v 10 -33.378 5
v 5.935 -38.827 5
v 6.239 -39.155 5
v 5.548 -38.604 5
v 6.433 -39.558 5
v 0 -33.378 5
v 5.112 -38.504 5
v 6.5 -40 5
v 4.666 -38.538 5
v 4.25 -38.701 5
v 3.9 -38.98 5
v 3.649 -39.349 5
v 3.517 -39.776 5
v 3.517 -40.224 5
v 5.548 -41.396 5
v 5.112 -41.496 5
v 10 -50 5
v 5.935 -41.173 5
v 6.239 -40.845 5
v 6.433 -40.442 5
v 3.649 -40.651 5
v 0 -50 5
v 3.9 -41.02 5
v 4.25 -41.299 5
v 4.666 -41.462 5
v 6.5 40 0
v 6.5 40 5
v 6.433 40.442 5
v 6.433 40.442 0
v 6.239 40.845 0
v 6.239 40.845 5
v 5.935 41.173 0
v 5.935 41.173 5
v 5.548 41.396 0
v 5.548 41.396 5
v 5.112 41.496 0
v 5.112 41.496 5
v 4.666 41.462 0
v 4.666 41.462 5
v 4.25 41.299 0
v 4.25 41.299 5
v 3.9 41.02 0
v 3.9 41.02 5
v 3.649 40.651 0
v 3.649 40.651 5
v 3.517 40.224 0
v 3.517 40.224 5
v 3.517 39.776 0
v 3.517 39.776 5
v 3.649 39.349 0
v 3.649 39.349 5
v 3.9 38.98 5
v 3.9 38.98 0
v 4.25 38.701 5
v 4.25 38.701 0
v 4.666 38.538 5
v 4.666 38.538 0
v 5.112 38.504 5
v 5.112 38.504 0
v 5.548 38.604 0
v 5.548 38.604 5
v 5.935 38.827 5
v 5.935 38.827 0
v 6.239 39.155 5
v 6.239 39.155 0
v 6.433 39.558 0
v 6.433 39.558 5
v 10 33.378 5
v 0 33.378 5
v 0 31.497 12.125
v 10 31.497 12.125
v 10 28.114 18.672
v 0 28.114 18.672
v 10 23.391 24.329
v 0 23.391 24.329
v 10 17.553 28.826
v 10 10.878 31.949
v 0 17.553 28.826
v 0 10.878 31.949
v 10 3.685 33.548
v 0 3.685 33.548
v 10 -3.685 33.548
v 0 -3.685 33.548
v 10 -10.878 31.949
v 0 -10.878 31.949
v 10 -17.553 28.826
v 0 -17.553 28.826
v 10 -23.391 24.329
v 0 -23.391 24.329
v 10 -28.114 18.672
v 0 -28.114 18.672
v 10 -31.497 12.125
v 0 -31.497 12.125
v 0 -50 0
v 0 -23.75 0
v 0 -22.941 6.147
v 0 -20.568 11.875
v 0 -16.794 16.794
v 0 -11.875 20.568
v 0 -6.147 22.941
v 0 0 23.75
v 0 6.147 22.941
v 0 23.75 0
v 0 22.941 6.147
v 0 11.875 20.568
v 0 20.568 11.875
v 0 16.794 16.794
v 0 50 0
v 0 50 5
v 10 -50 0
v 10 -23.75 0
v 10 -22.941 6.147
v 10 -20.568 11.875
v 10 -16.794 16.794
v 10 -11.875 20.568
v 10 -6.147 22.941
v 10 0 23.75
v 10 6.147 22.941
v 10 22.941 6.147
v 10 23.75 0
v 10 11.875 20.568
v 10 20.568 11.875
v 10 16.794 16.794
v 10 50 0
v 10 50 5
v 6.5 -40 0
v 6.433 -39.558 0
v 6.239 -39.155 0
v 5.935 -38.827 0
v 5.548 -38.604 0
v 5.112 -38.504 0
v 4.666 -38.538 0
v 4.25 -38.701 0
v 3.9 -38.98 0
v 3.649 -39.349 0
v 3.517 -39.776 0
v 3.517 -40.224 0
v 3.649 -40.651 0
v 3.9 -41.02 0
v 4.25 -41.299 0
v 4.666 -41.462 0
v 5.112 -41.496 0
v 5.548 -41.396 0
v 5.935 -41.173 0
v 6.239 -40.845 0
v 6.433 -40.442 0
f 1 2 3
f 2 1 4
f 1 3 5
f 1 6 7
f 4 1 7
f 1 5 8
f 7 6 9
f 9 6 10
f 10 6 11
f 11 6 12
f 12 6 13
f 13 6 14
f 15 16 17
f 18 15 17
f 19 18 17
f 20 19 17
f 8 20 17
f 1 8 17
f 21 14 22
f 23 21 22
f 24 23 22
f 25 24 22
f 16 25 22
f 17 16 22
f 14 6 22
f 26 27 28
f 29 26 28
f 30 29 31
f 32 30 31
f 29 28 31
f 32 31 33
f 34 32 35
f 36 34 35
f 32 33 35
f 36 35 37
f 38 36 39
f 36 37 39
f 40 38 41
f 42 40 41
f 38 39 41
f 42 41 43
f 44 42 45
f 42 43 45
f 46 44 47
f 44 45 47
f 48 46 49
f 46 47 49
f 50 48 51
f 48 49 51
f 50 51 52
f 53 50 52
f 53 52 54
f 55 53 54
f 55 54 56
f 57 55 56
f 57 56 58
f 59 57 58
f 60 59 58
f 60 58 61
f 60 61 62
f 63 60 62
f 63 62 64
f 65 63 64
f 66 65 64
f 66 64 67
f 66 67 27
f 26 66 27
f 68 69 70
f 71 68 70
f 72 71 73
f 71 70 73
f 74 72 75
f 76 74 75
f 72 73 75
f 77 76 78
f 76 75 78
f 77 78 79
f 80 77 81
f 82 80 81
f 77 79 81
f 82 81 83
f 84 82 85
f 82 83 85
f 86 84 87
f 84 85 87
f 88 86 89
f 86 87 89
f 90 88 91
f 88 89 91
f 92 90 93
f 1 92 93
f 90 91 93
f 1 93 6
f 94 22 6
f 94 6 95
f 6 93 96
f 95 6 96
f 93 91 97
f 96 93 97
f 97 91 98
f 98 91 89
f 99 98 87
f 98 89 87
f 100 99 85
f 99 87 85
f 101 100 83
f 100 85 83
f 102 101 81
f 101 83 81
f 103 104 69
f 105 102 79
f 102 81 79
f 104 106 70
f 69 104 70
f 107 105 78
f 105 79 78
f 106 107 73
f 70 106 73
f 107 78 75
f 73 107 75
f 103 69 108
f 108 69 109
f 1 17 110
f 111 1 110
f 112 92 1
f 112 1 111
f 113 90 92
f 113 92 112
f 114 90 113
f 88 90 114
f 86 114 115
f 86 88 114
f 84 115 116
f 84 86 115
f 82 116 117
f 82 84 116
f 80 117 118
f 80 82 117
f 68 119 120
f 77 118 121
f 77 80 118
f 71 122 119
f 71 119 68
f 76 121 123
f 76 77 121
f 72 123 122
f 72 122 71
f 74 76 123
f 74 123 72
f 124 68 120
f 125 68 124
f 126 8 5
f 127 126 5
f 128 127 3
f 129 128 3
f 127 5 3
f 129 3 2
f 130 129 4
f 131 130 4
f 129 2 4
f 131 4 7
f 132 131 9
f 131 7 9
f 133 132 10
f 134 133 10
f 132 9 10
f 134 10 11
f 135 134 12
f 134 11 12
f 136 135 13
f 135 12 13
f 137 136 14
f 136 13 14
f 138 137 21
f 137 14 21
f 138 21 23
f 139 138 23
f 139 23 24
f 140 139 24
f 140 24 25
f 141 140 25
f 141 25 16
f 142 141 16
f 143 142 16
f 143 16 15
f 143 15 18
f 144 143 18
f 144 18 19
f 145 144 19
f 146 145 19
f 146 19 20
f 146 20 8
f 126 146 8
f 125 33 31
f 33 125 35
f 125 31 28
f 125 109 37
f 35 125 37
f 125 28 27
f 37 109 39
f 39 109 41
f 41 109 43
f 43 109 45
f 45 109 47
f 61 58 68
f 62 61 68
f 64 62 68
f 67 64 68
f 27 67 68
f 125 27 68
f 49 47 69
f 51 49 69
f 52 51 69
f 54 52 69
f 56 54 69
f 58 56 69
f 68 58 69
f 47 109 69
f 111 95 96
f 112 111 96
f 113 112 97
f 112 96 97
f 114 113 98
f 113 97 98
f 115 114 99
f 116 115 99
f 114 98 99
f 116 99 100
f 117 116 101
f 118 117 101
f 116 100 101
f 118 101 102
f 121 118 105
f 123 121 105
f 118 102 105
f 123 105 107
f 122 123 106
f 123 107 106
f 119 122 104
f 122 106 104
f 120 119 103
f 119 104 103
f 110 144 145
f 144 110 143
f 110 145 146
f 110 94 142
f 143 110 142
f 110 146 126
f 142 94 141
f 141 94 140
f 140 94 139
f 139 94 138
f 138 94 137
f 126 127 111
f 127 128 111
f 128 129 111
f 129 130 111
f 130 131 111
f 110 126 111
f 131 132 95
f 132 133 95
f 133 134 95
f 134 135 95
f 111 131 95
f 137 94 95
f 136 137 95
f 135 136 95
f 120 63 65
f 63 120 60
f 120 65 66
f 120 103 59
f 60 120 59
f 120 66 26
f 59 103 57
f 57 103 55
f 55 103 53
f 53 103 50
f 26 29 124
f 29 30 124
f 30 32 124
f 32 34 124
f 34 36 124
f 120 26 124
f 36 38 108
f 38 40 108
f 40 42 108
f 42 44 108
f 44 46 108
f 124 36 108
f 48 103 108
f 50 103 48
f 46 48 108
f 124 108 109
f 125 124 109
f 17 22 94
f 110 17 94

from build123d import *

# Parameters (mm, degrees)
F1_DEPTH = 10
F2_R     = 1.5
F3_DEPTH = 25


with BuildPart() as f1:
    # F0 (on Right) → F1 (new body)
    with BuildSketch(Plane.YZ):
        with BuildLine():
            Line((-50, 0), (-23.75, 0))
            ThreePointArc((-23.75, 0), (0, 23.75), (23.75, 0))
            Line((23.75, 0), (50, 0))
            Line((50, 0), (50, 5))
            Line((50, 5), (33.377575, 5))
            ThreePointArc((33.377575, 5), (0, 33.75), (-33.377575, 5))
            Line((-33.377575, 5), (-50, 5))
            Line((-50, 5), (-50, 0))
        make_face()
    extrude(amount=F1_DEPTH)

    # F2 (on face) → F3 (cut)
    with BuildSketch(Plane.XY.offset(5)):
        with Locations((5, 40)):
            Circle(F2_R)
        with Locations((5, -40)):
            Circle(F2_R)
    extrude(amount=-F3_DEPTH, mode=Mode.SUBTRACT)


solid = f1.part
